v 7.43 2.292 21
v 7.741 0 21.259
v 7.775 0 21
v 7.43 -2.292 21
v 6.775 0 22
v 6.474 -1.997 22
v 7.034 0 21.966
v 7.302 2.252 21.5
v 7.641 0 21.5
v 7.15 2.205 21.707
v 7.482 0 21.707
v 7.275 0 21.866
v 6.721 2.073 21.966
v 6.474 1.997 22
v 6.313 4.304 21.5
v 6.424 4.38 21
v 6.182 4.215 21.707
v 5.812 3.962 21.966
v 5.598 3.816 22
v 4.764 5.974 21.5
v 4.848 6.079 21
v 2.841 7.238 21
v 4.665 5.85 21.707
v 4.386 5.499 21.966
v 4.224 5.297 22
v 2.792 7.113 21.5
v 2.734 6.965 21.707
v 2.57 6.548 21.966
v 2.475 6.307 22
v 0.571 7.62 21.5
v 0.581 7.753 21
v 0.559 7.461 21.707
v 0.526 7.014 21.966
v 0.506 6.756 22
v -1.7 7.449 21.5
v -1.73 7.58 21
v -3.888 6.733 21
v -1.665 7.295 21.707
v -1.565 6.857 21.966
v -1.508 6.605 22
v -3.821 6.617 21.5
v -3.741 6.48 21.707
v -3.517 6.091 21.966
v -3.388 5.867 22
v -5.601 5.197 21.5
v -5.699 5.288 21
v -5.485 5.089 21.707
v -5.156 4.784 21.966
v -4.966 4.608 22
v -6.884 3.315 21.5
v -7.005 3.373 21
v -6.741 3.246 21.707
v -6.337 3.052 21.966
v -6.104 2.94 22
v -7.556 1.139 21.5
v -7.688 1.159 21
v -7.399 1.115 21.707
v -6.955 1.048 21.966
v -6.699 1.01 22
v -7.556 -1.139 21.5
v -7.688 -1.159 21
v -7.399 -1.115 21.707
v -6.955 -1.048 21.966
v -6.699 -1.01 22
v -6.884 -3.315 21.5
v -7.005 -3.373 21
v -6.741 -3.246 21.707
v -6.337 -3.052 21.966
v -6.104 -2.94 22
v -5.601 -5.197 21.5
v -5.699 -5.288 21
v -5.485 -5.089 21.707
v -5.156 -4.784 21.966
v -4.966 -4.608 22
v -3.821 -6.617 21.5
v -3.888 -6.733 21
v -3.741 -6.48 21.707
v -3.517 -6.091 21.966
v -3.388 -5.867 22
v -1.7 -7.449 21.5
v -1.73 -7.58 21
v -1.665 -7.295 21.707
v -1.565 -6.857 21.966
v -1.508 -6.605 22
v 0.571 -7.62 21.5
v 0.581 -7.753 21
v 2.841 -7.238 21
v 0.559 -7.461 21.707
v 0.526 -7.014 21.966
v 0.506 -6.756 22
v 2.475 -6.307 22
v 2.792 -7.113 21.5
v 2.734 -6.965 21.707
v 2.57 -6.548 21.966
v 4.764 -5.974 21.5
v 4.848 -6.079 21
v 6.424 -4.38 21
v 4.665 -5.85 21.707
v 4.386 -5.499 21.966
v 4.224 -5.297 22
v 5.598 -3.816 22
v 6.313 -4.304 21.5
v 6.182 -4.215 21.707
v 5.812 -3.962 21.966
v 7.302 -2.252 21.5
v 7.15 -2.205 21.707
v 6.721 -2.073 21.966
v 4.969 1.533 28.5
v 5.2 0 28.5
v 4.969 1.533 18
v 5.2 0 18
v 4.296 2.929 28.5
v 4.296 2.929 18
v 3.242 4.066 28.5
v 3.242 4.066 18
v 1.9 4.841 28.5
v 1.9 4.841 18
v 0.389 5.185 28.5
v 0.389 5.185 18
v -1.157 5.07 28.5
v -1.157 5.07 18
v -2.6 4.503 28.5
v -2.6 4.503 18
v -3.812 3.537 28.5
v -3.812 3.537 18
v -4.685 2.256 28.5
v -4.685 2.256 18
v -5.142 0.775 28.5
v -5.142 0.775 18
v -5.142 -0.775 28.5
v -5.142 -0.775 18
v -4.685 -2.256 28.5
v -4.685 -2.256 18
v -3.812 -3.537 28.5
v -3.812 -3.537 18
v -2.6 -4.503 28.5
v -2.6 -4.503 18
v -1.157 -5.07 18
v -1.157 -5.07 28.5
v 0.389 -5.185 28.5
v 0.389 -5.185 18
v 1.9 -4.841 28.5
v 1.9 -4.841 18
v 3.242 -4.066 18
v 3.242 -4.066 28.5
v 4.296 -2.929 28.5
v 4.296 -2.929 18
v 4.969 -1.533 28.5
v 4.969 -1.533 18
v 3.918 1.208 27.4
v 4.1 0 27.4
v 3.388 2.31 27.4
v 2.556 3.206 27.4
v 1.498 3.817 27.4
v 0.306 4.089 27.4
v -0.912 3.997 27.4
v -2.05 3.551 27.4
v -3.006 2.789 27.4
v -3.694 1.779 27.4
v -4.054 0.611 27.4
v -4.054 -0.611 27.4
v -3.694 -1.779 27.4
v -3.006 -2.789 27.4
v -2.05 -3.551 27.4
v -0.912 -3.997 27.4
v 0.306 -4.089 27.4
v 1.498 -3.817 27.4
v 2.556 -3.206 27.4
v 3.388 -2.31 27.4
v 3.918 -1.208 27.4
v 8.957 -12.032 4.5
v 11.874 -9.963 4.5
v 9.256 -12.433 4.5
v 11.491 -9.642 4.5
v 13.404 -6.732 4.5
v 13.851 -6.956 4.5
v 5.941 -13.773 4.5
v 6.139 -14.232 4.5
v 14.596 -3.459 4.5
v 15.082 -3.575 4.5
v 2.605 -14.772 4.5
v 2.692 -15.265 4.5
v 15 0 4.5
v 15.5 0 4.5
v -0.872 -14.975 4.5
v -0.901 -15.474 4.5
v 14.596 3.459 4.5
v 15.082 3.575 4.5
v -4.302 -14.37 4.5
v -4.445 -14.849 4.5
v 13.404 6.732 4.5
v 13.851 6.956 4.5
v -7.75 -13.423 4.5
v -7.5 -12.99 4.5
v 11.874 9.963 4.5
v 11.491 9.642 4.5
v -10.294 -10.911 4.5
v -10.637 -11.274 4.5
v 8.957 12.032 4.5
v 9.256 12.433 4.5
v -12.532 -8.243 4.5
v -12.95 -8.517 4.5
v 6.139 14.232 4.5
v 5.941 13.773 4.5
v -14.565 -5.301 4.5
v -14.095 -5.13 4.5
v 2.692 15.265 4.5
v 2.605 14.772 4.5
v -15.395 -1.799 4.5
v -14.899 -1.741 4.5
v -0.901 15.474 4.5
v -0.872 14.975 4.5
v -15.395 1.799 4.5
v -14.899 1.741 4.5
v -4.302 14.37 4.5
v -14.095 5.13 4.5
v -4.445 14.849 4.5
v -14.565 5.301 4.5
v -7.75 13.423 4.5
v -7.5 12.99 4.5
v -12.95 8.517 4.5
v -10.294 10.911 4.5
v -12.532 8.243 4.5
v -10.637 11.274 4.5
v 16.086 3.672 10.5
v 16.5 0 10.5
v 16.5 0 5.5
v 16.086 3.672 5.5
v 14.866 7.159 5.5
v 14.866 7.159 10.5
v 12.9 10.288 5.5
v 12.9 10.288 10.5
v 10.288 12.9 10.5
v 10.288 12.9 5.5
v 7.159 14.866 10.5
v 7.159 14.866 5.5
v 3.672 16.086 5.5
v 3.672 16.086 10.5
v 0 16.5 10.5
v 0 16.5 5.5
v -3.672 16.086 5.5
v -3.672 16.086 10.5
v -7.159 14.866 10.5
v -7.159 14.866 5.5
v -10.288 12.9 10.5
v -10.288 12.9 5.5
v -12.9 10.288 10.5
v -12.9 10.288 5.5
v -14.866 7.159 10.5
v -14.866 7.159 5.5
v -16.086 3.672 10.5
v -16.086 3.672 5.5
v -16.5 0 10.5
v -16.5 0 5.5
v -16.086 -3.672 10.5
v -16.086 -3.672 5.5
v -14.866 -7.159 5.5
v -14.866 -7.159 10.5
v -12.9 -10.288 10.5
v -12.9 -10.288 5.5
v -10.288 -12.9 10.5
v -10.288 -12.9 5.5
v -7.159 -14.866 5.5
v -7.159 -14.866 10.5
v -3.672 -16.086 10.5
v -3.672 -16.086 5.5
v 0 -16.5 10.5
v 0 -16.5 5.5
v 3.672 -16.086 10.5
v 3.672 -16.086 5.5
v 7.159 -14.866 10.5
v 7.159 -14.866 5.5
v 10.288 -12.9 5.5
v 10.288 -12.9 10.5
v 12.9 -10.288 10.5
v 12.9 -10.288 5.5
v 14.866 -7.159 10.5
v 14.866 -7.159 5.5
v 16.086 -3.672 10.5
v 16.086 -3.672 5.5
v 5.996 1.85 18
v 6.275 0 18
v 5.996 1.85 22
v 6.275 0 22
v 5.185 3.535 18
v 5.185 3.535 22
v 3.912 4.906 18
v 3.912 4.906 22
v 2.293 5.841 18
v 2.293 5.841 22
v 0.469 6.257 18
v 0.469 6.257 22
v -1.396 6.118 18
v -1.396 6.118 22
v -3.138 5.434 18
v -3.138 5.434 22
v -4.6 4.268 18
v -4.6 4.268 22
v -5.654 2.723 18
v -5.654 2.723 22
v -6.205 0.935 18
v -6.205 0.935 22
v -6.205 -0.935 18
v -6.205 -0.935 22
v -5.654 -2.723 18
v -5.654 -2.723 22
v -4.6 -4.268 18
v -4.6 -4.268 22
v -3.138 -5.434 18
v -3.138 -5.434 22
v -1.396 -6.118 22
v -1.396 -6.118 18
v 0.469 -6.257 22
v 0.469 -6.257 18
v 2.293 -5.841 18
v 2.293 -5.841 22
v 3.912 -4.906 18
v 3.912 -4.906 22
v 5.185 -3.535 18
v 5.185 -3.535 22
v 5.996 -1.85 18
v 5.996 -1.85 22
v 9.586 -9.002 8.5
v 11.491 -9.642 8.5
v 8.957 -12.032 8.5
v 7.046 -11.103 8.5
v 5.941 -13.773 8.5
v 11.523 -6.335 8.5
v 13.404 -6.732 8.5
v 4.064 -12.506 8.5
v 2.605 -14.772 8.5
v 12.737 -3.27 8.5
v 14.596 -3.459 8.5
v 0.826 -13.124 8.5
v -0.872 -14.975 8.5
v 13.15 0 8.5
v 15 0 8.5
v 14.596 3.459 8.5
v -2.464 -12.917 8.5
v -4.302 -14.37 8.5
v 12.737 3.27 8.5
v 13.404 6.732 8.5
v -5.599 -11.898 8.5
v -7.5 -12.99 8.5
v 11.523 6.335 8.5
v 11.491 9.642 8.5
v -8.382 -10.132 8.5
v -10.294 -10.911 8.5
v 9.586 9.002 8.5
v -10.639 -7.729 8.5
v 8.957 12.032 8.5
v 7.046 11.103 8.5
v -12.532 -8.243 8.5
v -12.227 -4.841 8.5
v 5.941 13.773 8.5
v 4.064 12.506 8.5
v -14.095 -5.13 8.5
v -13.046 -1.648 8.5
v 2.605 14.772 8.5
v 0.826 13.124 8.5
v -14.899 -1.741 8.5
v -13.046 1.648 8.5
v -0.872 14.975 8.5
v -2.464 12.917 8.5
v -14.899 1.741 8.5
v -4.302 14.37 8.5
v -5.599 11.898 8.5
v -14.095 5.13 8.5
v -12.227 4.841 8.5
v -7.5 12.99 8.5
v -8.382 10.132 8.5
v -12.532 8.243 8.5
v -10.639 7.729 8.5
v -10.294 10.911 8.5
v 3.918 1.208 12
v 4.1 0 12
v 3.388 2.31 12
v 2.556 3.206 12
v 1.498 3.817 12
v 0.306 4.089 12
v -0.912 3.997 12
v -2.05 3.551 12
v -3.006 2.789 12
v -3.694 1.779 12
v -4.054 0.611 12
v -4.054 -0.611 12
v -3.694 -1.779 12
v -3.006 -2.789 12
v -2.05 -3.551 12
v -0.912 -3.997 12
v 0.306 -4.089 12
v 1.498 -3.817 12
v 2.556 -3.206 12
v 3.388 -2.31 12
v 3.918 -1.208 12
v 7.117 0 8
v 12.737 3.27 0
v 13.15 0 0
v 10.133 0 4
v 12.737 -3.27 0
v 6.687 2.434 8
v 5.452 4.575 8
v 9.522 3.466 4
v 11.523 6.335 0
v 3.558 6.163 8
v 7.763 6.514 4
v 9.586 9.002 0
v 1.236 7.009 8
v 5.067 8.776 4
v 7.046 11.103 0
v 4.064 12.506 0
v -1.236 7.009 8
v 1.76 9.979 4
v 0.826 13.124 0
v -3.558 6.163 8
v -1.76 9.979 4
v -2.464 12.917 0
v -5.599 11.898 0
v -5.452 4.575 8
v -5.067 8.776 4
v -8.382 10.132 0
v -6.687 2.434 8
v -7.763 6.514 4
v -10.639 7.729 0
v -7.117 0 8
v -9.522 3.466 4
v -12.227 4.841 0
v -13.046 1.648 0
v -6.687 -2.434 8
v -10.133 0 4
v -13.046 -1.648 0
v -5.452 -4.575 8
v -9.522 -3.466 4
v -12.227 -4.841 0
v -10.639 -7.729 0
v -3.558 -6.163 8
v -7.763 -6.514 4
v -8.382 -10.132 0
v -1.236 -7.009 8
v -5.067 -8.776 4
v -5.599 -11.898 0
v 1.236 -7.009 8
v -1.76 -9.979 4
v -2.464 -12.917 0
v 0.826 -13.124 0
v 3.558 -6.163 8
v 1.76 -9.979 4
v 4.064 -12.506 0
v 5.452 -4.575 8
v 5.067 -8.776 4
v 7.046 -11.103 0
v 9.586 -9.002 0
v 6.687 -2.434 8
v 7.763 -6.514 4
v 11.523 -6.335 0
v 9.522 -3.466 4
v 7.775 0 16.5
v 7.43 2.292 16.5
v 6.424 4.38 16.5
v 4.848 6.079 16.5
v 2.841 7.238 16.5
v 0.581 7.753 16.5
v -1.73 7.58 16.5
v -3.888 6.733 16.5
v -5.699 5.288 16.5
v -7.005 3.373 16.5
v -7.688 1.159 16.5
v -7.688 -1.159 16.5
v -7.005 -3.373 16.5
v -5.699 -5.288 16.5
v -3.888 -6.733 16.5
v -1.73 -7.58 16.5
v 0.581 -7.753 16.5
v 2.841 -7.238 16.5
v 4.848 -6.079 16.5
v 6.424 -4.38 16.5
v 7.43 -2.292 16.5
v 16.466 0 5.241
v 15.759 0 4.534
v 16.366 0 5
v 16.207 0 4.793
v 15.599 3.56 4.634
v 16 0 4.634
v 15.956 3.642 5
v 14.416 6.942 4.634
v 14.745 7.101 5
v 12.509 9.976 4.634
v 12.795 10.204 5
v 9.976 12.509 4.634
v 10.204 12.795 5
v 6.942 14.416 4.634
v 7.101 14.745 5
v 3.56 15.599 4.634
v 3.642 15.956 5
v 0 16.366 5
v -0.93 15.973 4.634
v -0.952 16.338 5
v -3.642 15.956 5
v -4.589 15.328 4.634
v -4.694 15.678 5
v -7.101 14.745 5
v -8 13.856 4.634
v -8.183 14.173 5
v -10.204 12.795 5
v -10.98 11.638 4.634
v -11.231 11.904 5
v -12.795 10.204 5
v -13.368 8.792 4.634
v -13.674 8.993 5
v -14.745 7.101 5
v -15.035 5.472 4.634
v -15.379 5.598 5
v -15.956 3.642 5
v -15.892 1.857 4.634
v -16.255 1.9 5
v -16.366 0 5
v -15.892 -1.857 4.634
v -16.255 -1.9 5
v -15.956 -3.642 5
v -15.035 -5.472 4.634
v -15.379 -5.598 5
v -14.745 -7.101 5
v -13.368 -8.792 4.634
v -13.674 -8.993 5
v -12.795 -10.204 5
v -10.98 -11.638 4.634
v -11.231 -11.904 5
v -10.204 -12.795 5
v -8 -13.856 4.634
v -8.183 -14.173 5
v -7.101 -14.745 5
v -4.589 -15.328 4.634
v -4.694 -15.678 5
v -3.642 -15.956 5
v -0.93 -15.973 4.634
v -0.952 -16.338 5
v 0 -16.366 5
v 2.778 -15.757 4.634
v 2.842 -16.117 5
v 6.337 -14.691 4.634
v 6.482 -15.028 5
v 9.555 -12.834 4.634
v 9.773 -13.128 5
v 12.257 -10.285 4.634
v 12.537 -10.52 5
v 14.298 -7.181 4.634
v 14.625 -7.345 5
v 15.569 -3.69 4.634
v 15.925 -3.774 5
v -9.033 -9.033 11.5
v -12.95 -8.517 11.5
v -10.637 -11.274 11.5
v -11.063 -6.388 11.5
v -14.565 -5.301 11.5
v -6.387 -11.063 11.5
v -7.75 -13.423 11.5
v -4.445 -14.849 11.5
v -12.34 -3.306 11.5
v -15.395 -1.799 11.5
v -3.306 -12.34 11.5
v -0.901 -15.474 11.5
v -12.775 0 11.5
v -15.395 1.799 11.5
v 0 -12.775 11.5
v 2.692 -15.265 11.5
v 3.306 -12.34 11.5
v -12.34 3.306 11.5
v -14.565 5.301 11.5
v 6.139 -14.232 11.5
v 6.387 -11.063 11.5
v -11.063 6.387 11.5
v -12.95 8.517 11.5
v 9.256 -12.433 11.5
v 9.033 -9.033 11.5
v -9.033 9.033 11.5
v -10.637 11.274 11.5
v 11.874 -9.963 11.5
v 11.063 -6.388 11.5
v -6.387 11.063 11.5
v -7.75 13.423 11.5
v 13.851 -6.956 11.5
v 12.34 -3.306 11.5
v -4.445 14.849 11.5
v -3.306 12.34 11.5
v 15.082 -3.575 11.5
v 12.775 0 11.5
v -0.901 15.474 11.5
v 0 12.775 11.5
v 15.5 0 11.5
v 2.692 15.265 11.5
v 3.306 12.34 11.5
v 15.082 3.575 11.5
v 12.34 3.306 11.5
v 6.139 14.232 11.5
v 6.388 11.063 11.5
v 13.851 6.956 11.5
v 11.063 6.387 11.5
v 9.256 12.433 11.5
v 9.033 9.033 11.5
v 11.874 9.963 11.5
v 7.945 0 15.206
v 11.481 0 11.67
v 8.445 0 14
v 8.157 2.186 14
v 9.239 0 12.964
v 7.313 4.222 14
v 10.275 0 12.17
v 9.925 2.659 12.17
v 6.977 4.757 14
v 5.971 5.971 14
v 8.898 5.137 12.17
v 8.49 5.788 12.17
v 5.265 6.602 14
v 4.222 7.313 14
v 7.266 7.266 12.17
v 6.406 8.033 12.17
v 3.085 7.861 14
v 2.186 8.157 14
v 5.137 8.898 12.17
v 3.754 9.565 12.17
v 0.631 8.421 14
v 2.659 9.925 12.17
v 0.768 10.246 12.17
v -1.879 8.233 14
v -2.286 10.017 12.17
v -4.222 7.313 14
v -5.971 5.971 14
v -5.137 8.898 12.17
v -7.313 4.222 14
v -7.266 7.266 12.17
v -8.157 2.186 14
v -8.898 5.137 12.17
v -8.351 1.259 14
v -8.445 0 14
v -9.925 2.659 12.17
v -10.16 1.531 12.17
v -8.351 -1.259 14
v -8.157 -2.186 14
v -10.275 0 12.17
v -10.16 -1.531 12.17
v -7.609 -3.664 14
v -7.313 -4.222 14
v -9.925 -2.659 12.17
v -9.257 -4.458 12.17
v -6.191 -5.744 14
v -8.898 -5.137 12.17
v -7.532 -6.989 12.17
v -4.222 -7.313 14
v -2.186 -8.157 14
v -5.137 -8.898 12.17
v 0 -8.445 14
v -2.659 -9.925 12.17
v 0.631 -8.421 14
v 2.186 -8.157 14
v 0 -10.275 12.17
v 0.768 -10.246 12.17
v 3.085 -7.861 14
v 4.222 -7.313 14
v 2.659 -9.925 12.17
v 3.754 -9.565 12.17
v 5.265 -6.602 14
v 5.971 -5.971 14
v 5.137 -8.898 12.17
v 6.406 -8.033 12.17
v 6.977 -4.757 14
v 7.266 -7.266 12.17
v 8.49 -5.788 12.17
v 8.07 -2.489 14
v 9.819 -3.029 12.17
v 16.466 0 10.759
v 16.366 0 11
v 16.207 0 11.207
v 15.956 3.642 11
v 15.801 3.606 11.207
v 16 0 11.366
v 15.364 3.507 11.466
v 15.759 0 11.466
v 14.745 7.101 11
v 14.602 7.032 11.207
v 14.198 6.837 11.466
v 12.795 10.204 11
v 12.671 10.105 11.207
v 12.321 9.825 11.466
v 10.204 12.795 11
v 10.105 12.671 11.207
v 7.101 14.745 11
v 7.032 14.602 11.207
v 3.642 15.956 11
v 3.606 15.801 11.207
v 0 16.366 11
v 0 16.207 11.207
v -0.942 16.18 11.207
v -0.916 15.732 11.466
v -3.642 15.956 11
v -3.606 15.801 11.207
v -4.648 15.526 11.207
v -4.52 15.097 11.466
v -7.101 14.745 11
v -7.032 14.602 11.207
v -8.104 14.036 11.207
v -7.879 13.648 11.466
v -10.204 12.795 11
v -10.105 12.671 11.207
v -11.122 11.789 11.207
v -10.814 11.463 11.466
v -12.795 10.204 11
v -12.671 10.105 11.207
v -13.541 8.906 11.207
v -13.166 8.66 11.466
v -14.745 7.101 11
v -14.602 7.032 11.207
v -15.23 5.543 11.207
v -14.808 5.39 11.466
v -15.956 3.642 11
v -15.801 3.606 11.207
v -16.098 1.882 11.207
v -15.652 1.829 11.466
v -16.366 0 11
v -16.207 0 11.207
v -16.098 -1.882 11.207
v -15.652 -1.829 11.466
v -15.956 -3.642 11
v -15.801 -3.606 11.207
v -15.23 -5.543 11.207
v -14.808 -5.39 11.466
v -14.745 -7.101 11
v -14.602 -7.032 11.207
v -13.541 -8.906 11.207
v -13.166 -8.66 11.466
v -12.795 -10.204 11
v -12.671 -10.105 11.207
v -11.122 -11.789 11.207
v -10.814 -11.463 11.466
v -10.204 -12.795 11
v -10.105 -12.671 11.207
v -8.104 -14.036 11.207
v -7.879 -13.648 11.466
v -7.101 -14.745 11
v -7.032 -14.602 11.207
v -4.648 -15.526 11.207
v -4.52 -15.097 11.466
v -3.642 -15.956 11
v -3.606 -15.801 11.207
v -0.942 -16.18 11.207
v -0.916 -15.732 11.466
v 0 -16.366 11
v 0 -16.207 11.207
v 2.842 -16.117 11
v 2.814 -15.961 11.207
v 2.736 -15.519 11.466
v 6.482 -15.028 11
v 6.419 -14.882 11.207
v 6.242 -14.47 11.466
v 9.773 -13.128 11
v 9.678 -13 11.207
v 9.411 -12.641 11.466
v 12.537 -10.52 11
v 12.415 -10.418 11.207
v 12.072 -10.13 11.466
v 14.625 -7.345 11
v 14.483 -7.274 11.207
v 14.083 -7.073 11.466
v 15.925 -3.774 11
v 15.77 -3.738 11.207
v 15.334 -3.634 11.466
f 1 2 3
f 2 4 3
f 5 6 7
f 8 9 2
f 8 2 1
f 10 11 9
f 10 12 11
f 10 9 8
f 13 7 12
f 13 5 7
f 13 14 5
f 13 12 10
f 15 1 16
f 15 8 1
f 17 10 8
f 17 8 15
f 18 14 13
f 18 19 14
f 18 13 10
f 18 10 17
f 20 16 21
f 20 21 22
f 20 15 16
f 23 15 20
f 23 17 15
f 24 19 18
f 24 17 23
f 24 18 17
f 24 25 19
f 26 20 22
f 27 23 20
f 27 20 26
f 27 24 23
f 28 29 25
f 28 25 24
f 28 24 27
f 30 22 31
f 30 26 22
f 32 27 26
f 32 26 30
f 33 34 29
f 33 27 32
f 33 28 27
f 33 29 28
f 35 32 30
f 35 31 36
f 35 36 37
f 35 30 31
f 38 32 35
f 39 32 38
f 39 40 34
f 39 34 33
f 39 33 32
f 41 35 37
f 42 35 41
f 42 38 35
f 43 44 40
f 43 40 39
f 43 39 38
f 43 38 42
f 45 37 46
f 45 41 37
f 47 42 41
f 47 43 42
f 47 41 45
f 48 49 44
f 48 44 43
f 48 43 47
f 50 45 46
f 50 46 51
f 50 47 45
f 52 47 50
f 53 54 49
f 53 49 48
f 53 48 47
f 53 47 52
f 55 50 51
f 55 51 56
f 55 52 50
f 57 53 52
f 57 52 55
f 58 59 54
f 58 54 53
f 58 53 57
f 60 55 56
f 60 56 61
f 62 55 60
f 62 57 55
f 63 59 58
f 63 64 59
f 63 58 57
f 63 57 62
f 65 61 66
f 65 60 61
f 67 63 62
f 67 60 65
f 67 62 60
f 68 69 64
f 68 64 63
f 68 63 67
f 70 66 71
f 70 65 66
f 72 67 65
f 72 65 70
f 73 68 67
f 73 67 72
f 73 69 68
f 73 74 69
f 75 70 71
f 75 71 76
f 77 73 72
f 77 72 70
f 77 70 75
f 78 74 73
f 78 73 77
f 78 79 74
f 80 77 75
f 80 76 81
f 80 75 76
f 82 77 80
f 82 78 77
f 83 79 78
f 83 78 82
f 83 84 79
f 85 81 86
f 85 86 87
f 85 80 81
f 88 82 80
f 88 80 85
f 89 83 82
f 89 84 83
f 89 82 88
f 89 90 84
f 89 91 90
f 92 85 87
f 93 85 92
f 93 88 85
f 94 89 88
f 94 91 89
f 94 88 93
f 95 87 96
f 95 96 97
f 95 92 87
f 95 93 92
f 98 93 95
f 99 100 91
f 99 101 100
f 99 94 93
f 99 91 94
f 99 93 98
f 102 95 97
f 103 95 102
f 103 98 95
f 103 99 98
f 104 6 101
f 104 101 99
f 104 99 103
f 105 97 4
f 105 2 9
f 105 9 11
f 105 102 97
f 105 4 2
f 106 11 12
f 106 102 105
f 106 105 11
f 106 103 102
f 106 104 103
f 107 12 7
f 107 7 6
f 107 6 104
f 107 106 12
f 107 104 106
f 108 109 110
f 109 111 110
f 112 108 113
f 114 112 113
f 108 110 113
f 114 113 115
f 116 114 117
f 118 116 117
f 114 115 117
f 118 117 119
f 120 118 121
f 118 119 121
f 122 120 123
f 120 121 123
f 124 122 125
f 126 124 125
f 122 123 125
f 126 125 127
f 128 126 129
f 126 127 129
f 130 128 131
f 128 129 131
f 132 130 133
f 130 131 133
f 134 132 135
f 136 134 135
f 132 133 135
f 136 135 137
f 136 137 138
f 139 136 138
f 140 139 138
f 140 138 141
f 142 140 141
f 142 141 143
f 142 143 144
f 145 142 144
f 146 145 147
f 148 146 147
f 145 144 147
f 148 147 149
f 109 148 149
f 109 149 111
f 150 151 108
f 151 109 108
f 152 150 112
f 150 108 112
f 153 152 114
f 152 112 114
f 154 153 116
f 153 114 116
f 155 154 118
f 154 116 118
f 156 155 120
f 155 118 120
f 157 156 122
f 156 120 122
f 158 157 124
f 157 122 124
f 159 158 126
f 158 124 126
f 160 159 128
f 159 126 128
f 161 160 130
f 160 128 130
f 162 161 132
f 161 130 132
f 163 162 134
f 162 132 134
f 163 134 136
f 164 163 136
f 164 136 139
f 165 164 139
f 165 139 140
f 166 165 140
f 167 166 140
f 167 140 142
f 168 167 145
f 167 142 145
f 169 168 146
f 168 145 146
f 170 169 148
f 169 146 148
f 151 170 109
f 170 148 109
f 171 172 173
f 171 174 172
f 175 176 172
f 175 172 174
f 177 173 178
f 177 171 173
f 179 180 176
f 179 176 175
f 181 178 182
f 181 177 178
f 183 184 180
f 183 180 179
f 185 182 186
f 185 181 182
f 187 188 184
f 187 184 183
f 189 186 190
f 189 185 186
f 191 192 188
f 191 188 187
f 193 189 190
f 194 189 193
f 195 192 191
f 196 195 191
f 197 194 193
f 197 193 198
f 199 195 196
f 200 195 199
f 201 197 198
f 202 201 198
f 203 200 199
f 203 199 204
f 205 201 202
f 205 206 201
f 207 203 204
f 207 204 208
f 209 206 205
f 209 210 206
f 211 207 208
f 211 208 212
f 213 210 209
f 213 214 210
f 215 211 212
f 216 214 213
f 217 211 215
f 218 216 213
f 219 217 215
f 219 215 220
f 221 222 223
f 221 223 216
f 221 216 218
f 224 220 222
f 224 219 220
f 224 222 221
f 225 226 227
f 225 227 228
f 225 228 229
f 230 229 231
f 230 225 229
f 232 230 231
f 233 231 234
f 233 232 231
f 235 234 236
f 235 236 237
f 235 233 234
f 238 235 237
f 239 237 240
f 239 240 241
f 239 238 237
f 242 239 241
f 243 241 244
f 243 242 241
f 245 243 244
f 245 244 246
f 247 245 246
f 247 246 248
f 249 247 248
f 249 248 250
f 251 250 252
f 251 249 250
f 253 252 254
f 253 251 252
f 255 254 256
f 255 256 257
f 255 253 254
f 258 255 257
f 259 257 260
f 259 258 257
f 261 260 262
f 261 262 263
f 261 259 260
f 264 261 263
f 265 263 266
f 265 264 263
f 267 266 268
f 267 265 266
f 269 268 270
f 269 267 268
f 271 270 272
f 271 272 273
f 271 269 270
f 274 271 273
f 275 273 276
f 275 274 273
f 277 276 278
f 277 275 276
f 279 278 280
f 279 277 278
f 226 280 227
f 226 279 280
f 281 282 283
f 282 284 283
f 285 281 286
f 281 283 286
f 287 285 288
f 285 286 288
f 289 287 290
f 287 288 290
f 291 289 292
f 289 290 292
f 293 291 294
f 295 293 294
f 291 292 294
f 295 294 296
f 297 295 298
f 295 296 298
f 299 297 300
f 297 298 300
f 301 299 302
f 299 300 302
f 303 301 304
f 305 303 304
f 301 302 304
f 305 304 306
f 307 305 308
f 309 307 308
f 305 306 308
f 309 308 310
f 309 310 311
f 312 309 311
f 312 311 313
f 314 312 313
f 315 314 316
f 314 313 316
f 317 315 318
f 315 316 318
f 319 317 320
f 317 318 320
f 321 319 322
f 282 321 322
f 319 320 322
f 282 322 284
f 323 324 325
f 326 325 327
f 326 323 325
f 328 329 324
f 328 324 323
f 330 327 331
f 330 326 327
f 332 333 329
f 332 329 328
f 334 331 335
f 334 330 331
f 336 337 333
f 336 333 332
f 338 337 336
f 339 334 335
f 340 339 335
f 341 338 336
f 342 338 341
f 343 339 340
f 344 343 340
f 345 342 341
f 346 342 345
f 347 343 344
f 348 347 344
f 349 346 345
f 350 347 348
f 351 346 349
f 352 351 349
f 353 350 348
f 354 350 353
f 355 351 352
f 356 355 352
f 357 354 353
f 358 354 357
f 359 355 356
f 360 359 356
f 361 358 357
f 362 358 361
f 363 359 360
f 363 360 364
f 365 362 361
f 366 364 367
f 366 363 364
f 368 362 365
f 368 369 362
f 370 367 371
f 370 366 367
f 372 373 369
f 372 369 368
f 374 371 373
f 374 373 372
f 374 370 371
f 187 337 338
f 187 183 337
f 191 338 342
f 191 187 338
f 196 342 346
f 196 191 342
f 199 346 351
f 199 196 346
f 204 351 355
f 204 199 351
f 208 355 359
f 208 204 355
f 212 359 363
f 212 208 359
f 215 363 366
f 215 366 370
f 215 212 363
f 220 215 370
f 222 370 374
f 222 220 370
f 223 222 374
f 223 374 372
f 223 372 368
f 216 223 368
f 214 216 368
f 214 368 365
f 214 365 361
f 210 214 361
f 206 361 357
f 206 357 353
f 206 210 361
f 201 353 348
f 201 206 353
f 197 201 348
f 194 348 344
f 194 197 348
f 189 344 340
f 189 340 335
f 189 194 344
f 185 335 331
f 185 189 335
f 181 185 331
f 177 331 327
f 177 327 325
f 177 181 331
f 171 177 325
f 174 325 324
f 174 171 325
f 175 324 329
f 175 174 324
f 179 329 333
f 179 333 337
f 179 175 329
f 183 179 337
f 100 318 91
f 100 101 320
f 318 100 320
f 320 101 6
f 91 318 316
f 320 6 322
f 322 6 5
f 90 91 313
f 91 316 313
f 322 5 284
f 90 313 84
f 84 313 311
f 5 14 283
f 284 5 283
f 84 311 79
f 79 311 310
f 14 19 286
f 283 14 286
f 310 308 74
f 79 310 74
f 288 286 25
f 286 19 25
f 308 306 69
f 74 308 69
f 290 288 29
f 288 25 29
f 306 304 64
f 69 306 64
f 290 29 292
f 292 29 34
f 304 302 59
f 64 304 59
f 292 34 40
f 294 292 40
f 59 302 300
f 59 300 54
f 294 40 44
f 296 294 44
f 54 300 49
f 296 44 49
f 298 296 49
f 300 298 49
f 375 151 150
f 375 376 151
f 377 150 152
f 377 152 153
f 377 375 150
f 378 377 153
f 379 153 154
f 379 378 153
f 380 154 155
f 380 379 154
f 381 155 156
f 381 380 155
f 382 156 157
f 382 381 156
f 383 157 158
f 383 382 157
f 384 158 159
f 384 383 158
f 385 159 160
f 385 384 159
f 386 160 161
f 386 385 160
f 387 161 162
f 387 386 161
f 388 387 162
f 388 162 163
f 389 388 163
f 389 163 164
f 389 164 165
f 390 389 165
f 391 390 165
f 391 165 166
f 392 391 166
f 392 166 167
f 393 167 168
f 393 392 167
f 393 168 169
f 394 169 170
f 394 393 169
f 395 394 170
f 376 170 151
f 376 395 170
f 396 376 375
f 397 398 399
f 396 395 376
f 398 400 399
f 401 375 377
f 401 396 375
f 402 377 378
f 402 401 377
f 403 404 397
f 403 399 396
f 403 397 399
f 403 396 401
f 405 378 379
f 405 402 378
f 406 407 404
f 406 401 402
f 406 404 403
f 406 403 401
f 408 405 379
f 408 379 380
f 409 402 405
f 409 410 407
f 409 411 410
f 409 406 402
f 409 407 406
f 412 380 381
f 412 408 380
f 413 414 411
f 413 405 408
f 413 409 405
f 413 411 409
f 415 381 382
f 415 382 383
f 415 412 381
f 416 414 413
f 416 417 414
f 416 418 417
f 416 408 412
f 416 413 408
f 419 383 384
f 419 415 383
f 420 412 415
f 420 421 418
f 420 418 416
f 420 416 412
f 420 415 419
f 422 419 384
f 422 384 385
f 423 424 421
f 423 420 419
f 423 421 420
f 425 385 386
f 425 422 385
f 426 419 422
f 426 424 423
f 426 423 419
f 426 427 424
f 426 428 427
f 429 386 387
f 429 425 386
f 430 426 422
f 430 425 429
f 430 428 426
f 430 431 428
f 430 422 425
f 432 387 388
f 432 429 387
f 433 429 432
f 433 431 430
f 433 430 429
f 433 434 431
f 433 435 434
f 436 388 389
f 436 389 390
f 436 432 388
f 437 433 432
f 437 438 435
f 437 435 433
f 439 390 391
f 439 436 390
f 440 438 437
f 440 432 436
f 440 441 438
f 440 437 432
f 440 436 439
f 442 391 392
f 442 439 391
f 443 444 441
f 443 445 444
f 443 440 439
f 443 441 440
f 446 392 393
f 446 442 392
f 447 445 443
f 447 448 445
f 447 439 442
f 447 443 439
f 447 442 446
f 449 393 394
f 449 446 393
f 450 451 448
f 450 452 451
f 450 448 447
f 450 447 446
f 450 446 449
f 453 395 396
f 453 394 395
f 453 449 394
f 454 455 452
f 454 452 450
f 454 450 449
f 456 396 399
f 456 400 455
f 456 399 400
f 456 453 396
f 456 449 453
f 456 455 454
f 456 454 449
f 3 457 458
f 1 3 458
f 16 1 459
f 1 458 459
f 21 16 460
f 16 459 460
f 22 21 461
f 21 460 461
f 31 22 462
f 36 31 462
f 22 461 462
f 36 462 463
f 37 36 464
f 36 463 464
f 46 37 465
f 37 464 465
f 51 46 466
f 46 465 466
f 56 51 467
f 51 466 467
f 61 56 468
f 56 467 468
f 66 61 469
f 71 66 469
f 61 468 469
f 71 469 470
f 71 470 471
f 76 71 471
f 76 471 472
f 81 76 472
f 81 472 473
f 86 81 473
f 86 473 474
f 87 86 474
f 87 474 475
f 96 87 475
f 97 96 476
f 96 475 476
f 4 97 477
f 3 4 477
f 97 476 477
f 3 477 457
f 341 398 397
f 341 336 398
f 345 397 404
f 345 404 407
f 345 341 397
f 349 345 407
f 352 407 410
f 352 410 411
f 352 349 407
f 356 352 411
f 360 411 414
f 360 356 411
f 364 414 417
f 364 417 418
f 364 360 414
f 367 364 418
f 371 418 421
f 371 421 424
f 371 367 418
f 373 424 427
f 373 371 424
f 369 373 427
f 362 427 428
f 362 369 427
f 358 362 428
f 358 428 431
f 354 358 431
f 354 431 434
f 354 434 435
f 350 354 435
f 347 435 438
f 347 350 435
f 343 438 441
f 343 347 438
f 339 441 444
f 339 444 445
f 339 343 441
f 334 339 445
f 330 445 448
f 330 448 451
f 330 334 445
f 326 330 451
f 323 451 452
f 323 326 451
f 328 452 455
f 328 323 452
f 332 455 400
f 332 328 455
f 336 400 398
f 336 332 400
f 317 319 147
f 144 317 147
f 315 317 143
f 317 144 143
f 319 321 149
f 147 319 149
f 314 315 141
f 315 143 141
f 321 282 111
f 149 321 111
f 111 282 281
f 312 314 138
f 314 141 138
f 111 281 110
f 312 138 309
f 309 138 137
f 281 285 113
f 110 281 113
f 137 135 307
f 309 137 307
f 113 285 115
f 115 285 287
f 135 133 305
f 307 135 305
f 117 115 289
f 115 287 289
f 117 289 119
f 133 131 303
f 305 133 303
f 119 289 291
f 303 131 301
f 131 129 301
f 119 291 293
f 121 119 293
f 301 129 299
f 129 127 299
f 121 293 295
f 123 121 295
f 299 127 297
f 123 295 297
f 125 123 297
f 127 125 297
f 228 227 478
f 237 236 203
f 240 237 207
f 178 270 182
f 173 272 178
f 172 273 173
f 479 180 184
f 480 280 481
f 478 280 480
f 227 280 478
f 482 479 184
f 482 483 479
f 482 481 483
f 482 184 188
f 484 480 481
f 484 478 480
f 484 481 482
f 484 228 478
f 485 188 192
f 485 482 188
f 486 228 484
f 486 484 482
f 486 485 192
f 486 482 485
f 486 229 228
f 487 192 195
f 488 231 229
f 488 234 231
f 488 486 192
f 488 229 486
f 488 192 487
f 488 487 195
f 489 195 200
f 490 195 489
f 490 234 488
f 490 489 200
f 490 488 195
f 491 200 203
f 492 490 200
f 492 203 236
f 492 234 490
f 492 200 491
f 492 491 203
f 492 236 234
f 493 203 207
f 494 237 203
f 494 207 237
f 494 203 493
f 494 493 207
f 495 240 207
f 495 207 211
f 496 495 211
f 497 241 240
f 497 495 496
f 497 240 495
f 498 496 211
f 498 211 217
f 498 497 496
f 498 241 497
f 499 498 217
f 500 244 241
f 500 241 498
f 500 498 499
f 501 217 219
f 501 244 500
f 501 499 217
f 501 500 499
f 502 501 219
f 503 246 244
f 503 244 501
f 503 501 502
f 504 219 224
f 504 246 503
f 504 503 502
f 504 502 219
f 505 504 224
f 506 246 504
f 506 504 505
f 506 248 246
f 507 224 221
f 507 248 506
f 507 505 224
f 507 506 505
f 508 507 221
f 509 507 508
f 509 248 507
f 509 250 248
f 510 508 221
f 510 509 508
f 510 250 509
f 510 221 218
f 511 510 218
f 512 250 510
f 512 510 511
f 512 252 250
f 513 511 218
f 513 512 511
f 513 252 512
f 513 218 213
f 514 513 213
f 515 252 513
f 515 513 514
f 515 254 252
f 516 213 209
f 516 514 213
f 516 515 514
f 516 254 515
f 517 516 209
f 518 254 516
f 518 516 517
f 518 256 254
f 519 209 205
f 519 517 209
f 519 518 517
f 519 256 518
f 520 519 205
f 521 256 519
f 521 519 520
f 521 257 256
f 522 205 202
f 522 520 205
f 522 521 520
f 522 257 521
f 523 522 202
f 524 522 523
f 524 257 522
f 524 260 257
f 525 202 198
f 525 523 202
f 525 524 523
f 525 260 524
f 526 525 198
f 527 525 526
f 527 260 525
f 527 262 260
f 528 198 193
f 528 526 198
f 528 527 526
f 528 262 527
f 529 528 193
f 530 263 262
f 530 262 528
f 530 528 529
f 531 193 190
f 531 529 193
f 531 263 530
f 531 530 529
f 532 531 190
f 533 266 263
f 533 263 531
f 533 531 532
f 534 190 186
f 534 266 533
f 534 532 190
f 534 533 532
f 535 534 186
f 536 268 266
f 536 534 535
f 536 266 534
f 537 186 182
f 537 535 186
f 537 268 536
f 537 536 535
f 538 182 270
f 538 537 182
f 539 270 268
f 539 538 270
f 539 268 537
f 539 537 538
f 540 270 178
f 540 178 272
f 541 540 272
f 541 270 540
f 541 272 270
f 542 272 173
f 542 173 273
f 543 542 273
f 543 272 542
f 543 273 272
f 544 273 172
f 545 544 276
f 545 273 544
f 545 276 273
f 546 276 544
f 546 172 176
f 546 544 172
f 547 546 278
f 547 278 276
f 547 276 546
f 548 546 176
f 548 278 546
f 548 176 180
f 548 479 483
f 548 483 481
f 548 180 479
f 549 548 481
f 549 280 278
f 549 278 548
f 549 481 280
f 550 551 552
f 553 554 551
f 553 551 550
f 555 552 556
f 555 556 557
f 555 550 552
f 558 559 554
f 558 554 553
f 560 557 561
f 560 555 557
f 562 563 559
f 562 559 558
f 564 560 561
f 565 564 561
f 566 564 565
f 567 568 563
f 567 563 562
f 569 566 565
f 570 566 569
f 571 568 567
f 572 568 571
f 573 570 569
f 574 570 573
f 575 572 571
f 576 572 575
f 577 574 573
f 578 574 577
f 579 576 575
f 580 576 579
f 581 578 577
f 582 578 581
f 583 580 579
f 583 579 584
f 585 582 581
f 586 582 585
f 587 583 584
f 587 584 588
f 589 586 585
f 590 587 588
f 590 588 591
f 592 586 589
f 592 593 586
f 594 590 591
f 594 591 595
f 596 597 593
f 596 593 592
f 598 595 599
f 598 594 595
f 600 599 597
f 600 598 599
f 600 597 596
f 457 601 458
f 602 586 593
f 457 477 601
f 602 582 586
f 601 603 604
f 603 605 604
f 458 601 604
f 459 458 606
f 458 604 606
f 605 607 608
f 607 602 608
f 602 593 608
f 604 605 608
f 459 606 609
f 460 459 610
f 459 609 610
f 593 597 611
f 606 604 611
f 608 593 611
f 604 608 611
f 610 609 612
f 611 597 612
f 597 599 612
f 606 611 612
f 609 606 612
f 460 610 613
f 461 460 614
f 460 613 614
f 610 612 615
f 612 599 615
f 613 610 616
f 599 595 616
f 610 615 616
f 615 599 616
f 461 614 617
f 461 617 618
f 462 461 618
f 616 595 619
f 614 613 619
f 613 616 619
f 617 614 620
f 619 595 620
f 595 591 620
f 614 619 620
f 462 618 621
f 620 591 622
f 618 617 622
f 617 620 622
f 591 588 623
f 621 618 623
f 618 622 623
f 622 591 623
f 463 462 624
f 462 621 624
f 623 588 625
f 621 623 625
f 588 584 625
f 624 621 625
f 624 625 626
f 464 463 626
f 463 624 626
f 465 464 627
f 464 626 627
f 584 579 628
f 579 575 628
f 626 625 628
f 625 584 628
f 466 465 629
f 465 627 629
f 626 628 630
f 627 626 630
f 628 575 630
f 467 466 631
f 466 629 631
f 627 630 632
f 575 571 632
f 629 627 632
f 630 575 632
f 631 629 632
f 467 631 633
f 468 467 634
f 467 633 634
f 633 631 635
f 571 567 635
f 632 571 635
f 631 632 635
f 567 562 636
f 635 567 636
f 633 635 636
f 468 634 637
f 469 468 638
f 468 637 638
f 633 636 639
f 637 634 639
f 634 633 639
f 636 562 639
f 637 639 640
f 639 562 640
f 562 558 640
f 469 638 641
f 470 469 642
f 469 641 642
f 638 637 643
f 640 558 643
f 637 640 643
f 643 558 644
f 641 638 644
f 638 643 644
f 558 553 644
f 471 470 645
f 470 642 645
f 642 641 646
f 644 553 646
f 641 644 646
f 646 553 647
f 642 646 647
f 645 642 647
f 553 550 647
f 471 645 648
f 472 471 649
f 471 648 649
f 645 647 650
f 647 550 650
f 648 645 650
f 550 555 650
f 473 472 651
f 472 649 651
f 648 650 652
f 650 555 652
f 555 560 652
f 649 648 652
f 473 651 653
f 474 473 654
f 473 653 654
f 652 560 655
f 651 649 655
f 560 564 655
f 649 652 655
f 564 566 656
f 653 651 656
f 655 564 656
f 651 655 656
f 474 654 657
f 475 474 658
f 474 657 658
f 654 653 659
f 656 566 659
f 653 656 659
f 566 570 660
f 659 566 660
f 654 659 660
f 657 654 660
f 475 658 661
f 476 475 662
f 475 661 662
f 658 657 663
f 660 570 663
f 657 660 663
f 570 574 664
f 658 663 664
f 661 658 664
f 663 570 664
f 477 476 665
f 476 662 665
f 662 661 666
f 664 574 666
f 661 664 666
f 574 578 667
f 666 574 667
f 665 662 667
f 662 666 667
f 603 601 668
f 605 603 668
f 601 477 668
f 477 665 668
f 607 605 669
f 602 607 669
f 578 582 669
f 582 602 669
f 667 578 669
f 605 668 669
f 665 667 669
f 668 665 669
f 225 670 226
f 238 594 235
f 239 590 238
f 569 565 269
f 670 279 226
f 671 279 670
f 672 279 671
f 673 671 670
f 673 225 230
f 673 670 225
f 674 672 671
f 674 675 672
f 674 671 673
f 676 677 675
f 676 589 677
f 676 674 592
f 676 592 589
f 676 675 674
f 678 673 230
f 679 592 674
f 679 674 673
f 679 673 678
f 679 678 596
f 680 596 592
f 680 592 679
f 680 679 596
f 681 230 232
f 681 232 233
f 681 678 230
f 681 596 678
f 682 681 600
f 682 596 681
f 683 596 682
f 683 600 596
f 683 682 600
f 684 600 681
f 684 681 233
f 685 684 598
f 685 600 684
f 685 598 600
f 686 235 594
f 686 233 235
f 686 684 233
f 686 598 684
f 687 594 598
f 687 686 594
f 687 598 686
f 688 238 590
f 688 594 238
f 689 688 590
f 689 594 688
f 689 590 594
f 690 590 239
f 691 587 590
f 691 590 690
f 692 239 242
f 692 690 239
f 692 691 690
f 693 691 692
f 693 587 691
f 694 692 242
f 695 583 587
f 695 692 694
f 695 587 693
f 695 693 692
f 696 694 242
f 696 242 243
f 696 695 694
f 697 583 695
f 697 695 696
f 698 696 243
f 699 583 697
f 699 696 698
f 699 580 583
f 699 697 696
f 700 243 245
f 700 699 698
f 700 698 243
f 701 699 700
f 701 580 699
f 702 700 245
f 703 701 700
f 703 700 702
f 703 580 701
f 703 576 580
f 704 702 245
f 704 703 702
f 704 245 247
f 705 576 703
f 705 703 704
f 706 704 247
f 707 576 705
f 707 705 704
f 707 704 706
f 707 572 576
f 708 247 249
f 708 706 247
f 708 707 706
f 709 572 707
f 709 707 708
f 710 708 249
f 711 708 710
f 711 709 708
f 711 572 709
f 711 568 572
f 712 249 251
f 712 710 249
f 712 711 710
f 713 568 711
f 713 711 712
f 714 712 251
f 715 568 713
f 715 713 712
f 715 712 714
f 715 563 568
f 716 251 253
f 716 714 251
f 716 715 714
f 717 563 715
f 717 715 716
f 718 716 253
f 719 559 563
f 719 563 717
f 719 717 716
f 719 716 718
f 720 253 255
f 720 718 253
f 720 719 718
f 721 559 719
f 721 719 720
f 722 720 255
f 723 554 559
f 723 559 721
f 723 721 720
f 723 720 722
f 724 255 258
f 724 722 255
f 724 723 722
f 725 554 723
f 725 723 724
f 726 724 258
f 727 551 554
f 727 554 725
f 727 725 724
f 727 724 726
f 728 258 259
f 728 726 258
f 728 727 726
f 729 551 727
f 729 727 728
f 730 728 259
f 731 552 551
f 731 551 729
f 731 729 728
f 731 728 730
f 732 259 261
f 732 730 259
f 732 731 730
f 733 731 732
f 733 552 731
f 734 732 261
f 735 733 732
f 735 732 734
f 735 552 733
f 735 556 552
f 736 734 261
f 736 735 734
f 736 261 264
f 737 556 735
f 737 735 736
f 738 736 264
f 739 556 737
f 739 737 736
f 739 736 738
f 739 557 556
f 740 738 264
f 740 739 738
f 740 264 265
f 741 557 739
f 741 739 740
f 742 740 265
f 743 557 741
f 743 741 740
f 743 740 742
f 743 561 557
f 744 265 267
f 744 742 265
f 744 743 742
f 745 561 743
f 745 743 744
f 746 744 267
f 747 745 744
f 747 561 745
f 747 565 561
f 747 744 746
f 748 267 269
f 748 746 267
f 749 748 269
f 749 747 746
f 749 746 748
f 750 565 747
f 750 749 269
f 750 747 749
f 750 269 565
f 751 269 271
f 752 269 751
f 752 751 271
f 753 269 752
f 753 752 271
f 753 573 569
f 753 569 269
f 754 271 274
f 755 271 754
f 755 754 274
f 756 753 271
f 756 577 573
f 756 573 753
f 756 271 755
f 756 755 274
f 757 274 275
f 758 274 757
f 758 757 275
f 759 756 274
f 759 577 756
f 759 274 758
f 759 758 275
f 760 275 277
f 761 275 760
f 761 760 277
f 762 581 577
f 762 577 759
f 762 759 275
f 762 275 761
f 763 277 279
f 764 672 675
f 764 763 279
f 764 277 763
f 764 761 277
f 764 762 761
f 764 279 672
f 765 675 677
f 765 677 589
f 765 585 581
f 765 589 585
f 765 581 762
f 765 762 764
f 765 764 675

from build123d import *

# Parameters (mm, degrees)
FILLET_R    = 1
FILLET001_R = 1
FILLET002_R = 1


with BuildPart() as part:
    # Sketch → Revolution (revolve)
    with BuildSketch(Plane.XZ):
        with BuildLine():
            Line((4.1, 27.4), (4.1, 12))
            Line((4.1, 12), (13.15, 0))
            Line((13.15, 0), (13.15, 8.5))
            Line((13.15, 8.5), (15, 8.5))
            Line((15, 8.5), (15, 4.5))
            Line((15, 4.5), (16.5, 4.5))
            Line((16.5, 4.5), (16.5, 11.5))
            Line((16.5, 11.5), (12.775, 11.5))
            ThreePointArc((7.775, 16.5), (9.239466, 12.964466), (12.775, 11.5))
            Line((7.775, 22), (7.775, 16.5))
            Line((6.275, 22), (7.775, 22))
            Line((6.275, 18), (6.275, 22))
            Line((5.2, 18), (6.275, 18))
            Line((5.2, 28.5), (5.2, 18))
            Line((4.1, 27.4), (5.2, 28.5))
        make_face()
    revolve(axis=Axis((0, 0, 0), (0, 0, 1)))

    # Fillet
    fillet_edges = [part.edges().sort_by_distance(p)[0] for p in [
        (-16.5, 0, 4.5),
    ]]
    fillet(fillet_edges, radius=FILLET_R)

    # Fillet001
    fillet001_edges = [part.edges().sort_by_distance(p)[0] for p in [
        (-16.5, 0, 11.5),
    ]]
    fillet(fillet001_edges, radius=FILLET001_R)

    # Fillet002
    fillet002_edges = [part.edges().sort_by_distance(p)[0] for p in [
        (-7.775, 0, 22),
    ]]
    fillet(fillet002_edges, radius=FILLET002_R)


solid = part.part
